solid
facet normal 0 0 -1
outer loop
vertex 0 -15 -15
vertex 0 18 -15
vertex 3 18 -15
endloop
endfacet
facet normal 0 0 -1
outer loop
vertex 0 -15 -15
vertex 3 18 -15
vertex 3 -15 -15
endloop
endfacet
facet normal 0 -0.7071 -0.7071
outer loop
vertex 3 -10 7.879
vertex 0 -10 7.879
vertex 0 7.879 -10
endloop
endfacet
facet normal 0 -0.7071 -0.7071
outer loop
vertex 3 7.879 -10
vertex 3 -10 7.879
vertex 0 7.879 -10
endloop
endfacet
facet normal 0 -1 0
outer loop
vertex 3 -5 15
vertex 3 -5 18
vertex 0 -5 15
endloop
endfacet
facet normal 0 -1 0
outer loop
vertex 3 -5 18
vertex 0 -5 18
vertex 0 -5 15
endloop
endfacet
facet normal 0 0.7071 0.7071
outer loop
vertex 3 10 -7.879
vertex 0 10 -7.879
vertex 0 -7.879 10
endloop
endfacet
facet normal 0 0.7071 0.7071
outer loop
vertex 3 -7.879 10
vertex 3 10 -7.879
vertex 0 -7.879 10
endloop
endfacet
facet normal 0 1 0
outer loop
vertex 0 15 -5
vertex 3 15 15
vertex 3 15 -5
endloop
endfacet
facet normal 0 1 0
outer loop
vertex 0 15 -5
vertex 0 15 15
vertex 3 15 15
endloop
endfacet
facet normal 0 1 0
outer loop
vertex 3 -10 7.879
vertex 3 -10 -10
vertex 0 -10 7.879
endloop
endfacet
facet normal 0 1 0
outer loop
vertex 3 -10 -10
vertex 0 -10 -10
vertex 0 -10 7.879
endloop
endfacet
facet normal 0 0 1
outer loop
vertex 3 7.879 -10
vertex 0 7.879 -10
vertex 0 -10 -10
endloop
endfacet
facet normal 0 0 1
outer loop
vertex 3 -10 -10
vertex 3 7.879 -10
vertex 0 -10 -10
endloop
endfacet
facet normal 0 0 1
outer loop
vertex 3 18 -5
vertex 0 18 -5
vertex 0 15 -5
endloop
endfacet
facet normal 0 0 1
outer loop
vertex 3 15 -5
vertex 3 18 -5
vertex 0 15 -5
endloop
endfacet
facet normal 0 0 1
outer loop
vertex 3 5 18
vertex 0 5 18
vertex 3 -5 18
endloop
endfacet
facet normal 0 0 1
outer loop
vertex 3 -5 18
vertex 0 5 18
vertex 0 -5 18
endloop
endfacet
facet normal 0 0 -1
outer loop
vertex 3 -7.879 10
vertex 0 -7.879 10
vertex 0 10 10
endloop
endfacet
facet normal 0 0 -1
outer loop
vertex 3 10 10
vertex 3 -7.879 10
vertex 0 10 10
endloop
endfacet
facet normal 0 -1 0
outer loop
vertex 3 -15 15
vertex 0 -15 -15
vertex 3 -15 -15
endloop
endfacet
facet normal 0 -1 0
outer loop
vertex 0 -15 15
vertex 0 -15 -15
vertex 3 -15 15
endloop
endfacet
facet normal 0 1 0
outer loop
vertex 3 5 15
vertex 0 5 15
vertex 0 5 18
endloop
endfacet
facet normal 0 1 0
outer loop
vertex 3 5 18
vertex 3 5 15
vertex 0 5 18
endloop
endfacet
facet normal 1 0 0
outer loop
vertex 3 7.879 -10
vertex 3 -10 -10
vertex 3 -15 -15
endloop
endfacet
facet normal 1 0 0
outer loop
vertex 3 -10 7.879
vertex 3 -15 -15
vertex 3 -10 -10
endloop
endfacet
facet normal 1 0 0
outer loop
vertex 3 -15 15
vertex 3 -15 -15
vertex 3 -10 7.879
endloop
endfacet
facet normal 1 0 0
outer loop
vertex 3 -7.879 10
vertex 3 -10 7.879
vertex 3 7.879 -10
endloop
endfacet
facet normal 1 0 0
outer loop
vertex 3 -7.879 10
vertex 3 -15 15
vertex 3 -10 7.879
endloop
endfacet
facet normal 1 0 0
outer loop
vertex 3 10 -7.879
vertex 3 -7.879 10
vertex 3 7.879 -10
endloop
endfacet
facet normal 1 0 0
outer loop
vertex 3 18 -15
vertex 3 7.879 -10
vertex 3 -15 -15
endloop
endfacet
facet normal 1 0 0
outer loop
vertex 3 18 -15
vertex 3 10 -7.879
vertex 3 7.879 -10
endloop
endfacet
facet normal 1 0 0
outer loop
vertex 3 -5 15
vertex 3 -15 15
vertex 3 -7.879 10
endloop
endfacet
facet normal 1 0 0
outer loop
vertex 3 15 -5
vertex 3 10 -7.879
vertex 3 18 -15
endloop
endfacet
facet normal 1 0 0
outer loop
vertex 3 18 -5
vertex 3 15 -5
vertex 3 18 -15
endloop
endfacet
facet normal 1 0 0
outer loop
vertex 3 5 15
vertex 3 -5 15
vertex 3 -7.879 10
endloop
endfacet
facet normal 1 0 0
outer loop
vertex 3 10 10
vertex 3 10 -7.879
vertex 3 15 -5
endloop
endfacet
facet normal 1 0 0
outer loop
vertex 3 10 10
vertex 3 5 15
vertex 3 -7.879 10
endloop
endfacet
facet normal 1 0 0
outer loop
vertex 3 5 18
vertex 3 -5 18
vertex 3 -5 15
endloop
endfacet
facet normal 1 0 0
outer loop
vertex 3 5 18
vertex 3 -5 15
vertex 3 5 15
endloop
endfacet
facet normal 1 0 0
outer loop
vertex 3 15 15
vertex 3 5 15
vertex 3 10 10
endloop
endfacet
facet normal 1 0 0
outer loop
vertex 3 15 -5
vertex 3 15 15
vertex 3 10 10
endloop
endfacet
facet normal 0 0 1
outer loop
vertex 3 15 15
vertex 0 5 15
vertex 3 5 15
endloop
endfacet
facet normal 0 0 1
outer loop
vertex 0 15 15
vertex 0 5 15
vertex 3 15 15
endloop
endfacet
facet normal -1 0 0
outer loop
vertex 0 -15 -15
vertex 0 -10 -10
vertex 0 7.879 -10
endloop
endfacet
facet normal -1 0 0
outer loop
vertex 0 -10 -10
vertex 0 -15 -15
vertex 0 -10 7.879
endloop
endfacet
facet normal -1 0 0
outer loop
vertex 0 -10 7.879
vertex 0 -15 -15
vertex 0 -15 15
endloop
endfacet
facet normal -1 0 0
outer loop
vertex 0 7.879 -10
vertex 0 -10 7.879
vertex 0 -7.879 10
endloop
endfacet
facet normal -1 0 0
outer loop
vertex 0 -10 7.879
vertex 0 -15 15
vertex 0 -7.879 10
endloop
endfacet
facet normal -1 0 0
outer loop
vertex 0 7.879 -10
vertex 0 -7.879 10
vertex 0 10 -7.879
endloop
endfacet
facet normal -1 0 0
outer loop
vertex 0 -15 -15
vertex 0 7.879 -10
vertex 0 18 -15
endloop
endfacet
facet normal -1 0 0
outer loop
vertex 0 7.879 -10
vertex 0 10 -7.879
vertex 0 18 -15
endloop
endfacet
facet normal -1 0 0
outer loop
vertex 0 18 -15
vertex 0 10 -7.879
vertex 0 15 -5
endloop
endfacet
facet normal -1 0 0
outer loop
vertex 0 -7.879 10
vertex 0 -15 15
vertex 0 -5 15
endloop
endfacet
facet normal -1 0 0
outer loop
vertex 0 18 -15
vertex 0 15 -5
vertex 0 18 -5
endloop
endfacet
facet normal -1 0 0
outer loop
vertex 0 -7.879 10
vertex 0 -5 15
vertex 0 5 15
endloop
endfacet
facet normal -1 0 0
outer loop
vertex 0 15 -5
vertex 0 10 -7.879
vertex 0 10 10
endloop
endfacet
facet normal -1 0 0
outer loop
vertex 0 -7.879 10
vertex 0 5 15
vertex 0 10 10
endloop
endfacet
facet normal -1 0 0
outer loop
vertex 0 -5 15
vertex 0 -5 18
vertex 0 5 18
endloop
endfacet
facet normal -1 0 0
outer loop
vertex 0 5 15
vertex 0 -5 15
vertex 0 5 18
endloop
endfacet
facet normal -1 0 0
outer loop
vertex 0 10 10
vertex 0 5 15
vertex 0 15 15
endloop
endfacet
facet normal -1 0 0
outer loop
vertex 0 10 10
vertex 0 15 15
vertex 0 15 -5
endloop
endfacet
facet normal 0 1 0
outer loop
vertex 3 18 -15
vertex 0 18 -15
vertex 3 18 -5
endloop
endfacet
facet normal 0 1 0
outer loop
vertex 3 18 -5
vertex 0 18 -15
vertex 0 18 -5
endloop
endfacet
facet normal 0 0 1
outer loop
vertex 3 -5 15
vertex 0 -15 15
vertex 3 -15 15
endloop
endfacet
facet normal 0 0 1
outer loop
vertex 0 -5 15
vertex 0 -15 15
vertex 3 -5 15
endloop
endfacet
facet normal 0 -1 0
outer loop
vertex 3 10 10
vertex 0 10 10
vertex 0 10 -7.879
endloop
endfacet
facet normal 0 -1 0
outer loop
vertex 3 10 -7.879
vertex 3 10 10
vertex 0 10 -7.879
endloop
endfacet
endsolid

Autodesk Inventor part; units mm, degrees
ref_plane "YZ Plane" through (0, 0, 0) normal (1, 0, 0) x (0, 1, 0)
ref_plane "XZ Plane" through (0, 0, 0) normal (0, 1, 0) x (-1, 0, 0)
ref_plane "XY Plane" through (0, 0, 0) normal (0, 0, 1) x (1, 0, 0)
sketch "Sketch1" plane through (0, 0, 0) normal (1, 0, 0) x (0, 1, 0)
  line L0 (15, -15) -> (-15, -15)
  line L1 (-15, -15) -> (-15, 15)
  line L2 (-15, 15) -> (15, 15)
  line L3 (15, 15) -> (15, -15)
  line L4 (15, -15) -> (-15, 15) construction
  line L5 (-15, -15) -> (15, 15) construction
  line L6 (15, -15) -> (18, -15)
  line L7 (18, -15) -> (18, -5)
  line L8 (18, -5) -> (15, -5)
  line L9 (15, -5) -> (15, -15)
  line L10 (-5, 15) -> (5, 15)
  line L11 (5, 15) -> (5, 18)
  line L12 (5, 18) -> (-5, 18)
  line L13 (-5, 18) -> (-5, 15)
  point P0 (0, 0)
  point P1 (0, 18)
  point P2 (0, 0)
  dimension "d0" = 30
  dimension "d1" = 30
  dimension "d2" = 3
  dimension "d3" = 10
  dimension "d4" = 10
  dimension "d5" = 3
extrude "Extrusion1" add sketch "Sketch1" along normal blind 3
sketch "Sketch2" plane through (0, 0, 0) normal (-1, 0, 0) x (0, 0, 1)
  line L0 (15, -15) -> (-15, -15) projected
  line L1 (-15, -15) -> (-15, 18) projected
  line L2 (10, 10) -> (-10, 10)
  line L3 (-10, 10) -> (-10, -10)
  line L4 (-10, -10) -> (10, -10)
  line L5 (10, -10) -> (10, 10)
  line L6 (10, 10) -> (-10, -10) construction
  line L7 (-10, 10) -> (10, -10) construction
  point P0 (0, 0)
  dimension "d8" = 5
  dimension "d9" = 5
extrude "Extrusion2" cut sketch "Sketch2" against normal blind 3
sketch "Sketch3" plane through (0, 0, 0) normal (-1, 0, 0) x (0, 0, 1)
  line L0 (10, -10) -> (-10, -10) projected
  line L1 (10, 10) -> (10, -10) projected
  line L2 (-8.9393, 11.0607) -> (11.0607, -8.9393)
  line L3 (11.0607, -8.9393) -> (8.9393, -11.0607)
  line L4 (8.9393, -11.0607) -> (-11.0607, 8.9393)
  line L5 (-11.0607, 8.9393) -> (-8.9393, 11.0607)
  line L6 (-8.9393, 11.0607) -> (8.9393, -11.0607) construction
  line L7 (11.0607, -8.9393) -> (-11.0607, 8.9393) construction
  point P0 (0, 0)
  dimension "d12" = 3
extrude "Extrusion3" add sketch "Sketch3" against normal blind 3
equation "\"d9\" = d8"
properties part number "Motor Side support"
